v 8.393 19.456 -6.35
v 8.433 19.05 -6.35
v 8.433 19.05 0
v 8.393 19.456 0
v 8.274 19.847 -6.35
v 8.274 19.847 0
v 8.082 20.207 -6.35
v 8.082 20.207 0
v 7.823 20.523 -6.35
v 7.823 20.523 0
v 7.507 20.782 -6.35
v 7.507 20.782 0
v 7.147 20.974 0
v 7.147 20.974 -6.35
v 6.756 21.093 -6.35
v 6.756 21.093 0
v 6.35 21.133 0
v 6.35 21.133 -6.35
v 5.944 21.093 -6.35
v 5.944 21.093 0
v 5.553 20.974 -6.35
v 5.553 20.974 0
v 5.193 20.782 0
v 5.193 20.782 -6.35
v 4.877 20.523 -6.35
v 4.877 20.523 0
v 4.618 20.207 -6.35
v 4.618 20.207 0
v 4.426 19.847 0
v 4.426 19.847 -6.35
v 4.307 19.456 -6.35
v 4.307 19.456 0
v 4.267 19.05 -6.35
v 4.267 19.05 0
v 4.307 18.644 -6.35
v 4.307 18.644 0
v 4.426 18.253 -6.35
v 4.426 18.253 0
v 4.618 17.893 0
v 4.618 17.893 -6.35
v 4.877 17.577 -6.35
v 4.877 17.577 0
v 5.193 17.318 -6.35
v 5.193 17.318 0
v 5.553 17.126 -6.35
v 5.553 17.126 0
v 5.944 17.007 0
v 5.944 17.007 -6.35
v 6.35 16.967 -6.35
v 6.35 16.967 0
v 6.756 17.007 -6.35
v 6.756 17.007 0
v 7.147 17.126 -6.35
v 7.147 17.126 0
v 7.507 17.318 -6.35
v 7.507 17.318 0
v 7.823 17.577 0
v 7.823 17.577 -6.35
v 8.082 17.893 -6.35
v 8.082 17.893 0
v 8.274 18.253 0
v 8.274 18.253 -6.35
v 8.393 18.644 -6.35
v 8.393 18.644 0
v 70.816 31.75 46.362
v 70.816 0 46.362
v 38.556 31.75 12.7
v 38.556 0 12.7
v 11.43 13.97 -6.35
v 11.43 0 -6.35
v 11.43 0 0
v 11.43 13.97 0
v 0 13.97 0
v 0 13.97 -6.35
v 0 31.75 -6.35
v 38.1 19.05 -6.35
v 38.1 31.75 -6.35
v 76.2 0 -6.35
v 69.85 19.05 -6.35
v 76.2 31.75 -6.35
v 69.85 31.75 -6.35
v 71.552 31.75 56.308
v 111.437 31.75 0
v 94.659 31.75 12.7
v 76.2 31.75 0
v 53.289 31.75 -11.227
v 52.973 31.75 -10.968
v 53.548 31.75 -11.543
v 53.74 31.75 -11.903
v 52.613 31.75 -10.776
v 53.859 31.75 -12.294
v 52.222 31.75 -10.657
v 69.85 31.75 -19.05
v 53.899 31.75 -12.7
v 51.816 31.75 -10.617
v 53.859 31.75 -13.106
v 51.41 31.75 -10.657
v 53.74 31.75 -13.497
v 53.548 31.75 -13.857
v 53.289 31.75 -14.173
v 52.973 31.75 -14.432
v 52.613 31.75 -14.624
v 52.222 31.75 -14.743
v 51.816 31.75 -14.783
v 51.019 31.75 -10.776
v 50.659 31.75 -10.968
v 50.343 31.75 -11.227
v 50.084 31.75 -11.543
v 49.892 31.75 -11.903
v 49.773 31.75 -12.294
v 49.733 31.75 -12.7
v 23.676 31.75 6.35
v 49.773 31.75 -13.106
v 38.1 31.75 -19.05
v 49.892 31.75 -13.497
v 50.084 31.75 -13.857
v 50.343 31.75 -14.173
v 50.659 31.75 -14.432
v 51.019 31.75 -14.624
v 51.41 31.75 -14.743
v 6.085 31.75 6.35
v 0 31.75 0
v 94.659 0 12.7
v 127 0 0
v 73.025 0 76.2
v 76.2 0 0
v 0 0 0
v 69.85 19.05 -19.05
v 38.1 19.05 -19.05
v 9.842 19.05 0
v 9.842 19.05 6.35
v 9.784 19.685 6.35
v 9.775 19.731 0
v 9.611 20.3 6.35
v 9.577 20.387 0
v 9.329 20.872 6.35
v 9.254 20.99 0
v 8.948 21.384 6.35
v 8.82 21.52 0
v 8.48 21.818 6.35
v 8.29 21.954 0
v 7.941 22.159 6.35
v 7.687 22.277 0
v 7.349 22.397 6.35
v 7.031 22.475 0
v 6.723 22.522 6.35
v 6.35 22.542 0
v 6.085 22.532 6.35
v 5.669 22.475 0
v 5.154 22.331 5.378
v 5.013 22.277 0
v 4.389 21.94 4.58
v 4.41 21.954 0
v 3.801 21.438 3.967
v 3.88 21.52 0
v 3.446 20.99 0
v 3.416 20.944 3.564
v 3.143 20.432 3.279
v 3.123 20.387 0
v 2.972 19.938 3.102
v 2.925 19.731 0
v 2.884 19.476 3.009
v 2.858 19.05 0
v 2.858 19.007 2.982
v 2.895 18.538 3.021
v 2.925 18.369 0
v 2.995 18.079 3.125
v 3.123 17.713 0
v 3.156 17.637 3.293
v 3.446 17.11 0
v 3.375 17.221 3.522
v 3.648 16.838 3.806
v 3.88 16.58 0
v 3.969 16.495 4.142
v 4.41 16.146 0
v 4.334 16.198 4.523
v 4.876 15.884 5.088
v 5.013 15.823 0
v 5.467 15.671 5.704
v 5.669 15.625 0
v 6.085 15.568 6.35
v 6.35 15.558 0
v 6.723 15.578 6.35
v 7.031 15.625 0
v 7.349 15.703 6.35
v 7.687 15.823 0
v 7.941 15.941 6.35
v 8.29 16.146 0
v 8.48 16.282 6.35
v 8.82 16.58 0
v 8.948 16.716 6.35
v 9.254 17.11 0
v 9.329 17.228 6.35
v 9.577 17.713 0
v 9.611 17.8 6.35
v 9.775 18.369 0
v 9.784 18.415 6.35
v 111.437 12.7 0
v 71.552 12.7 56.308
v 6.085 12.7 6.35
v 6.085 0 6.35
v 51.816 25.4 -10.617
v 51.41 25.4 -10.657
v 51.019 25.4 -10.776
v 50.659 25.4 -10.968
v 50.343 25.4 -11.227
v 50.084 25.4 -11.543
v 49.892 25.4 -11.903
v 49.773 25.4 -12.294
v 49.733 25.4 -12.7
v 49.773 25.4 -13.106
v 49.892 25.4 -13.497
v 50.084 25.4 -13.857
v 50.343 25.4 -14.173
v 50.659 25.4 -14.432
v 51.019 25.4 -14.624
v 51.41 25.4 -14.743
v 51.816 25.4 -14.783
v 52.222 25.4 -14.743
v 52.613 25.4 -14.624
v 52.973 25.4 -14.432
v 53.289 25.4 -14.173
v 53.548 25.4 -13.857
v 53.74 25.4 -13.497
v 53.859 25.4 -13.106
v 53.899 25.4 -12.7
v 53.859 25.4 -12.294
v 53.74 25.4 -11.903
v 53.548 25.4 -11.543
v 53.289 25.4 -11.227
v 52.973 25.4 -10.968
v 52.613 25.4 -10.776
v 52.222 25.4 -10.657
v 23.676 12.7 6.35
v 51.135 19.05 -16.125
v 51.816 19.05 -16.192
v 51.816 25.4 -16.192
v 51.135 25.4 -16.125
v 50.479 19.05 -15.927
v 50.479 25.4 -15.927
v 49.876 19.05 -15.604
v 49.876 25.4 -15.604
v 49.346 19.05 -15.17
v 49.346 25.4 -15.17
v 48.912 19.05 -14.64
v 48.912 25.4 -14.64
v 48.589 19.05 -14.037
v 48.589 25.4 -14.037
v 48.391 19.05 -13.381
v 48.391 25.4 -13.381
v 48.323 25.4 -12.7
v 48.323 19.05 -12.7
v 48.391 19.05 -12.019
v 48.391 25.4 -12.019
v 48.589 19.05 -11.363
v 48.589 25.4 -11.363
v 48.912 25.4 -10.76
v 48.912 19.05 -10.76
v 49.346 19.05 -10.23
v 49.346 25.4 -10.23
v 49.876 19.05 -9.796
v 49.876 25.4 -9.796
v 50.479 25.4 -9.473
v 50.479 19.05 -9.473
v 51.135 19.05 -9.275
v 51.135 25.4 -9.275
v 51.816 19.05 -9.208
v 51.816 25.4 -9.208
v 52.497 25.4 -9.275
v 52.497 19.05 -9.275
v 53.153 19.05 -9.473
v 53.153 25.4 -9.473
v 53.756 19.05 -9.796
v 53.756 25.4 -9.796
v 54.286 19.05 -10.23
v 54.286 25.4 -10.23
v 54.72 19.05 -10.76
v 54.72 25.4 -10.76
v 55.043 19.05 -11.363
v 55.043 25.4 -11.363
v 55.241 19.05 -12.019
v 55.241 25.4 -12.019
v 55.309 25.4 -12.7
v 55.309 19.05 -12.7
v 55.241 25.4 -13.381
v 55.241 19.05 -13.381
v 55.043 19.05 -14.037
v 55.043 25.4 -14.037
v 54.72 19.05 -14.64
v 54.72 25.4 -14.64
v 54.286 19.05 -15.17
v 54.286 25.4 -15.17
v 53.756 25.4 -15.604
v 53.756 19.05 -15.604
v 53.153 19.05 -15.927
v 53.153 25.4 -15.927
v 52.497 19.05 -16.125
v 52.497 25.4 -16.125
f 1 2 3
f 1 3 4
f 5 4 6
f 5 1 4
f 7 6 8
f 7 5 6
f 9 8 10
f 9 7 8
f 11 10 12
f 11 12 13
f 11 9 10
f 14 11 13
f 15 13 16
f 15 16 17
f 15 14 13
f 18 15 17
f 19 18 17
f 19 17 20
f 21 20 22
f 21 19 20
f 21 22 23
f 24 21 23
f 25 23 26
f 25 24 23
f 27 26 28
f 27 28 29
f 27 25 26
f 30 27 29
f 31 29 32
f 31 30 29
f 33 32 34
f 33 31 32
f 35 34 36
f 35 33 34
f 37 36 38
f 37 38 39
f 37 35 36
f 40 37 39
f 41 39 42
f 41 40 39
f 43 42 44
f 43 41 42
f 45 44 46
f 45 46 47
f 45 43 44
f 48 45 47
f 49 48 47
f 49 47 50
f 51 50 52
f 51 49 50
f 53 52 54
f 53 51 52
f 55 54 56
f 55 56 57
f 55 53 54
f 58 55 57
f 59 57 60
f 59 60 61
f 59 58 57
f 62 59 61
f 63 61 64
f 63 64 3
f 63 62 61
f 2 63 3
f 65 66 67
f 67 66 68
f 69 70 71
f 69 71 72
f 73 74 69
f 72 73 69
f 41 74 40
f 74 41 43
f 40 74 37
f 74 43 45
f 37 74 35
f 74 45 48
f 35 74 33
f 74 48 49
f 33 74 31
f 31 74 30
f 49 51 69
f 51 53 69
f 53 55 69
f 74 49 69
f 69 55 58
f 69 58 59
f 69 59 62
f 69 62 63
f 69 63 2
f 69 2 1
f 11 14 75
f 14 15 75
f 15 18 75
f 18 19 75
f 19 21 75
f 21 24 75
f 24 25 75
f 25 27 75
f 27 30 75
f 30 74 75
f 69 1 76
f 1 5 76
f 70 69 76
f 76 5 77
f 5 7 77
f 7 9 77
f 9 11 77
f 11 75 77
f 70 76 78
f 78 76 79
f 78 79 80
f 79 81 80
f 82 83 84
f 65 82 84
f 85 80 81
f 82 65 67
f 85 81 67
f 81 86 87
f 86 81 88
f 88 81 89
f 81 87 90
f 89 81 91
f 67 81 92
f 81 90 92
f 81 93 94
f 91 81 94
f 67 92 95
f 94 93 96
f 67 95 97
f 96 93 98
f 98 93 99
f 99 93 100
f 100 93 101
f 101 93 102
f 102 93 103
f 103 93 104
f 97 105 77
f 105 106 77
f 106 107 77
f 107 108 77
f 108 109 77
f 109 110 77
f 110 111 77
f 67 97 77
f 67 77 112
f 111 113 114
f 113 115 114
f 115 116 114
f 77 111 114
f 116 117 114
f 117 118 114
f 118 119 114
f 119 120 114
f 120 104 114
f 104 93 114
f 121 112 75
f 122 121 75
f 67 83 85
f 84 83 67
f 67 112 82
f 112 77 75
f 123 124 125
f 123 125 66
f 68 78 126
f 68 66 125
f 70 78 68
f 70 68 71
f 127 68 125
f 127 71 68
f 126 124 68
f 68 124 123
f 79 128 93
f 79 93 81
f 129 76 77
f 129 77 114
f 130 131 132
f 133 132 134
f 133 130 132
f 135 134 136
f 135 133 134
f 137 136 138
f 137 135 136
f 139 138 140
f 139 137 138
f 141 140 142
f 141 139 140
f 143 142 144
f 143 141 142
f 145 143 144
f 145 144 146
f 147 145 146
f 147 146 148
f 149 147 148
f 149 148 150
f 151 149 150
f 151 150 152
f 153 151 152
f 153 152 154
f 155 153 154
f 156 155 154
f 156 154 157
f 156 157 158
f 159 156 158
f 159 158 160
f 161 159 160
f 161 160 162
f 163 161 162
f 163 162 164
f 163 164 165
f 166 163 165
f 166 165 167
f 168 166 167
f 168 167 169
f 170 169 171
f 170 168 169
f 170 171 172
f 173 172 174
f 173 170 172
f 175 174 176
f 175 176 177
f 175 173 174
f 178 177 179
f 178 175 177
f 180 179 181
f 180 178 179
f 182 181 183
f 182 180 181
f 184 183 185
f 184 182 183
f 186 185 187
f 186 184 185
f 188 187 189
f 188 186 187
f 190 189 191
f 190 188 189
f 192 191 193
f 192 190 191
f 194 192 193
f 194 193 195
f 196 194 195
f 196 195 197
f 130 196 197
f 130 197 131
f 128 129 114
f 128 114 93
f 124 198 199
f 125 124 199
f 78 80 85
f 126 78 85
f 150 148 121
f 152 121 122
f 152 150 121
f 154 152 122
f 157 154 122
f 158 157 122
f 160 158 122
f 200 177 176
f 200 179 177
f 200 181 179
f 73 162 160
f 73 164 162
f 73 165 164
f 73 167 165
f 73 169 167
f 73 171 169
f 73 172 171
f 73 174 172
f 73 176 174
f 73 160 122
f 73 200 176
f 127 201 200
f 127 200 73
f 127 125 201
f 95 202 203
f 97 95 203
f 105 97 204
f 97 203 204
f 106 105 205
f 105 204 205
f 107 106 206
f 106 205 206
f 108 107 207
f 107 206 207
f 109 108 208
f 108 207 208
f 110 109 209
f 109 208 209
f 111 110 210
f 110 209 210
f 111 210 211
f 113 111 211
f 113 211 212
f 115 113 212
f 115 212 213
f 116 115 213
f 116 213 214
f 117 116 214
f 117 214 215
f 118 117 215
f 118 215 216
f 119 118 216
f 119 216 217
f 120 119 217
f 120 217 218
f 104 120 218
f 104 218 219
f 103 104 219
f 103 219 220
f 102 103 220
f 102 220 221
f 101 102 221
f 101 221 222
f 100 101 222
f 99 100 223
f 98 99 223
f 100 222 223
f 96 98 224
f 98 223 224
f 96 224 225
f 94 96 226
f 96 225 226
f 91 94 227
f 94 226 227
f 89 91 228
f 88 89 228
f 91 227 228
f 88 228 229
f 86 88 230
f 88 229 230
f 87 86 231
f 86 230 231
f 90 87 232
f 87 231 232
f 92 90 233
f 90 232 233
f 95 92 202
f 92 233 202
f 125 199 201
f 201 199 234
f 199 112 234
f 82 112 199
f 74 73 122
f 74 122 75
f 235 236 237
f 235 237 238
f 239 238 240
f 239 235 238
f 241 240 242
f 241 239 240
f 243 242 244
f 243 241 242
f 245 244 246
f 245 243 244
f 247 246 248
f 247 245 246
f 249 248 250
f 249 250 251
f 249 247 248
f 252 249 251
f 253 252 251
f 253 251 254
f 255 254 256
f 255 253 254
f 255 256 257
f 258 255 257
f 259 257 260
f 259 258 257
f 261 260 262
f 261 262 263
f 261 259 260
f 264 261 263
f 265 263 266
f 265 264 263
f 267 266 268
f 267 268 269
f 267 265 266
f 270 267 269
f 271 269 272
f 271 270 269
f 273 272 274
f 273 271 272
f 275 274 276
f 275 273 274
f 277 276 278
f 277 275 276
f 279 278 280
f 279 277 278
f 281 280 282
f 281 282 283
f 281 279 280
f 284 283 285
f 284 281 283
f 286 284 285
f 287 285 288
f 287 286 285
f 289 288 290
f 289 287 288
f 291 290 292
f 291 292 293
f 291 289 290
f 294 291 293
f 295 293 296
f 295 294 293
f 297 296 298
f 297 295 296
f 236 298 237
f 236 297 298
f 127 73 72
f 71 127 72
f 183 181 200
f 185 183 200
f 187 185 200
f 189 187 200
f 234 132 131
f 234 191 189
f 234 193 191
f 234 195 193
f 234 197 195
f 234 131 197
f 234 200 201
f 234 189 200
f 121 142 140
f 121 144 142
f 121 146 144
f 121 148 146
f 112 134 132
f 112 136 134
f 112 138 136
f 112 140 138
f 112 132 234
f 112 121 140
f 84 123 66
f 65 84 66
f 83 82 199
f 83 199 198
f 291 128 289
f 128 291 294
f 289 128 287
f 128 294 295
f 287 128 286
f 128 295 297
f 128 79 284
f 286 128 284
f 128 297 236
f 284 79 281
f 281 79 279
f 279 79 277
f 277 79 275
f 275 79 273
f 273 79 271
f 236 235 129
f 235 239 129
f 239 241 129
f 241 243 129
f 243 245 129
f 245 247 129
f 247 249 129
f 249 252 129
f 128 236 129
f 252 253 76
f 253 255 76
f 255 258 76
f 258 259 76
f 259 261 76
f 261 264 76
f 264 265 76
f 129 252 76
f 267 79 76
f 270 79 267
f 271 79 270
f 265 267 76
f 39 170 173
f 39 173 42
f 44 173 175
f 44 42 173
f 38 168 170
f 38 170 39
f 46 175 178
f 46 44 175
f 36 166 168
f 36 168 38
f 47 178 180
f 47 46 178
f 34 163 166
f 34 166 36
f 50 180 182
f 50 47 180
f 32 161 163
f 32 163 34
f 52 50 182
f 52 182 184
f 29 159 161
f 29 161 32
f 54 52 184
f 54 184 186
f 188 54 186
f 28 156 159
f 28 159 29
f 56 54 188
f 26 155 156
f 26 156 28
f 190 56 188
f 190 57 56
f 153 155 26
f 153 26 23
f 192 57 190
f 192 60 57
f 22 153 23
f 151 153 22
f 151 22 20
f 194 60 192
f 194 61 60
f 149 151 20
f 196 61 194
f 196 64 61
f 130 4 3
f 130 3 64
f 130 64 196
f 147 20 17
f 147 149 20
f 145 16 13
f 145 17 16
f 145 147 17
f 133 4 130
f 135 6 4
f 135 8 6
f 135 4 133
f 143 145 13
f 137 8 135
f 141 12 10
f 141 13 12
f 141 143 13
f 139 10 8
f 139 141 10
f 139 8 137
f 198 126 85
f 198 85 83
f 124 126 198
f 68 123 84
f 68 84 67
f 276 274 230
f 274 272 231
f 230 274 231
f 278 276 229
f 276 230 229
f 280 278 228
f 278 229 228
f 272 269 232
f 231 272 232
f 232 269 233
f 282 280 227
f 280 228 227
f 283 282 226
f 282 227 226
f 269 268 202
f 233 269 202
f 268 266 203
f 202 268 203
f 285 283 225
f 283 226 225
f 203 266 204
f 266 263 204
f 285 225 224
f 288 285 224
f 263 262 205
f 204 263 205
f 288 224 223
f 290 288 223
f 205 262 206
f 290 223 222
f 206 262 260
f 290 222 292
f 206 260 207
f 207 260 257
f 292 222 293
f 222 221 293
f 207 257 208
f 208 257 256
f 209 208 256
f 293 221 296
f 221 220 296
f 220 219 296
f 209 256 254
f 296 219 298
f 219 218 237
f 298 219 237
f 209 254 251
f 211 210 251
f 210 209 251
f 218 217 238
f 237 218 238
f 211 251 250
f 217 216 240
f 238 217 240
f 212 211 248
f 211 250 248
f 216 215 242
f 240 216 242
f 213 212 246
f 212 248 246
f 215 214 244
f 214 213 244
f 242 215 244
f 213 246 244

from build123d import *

# Parameters (mm, degrees)
SKETCH2_R           = 2.0828
BOSS_EXTRUDE1_DEPTH = 31.75
SKETCH4_W           = 31.75
SKETCH4_H           = 12.7
CUT_EXTRUDE1_DEPTH  = 19.05
SKETCH5_R           = 3.4925
CUT_EXTRUDE2_DEPTH  = 6.35
CUT_EXTRUDE6_DEPTH  = 19.05
CHAMFER5_SIZE       = 12.7
CHAMFER7_SIZE       = 12.7
SKETCH6_R           = 3.4925
CUT_EXTRUDE8_DEPTH  = 25.4
SKETCH15_R          = 3.4925
SKETCH15_R_2        = 2.0828
BOSS_EXTRUDE2_DEPTH = 6.35
SKETCH14_W          = 11.43
SKETCH14_H          = 13.97
CUT_EXTRUDE10_DEPTH = 6.35


with BuildPart() as part:
    # Sketch2 → Boss-Extrude1 (new body)
    with BuildSketch(Plane(origin=(0, 0, 0), x_dir=(1, 0, 0), z_dir=(0, 1, 0))):
        Polygon((-69.85, 6.35), (-76.2, 6.35), (-76.2, 0), (-127, 0), (-73.025, -76.2), (0, 0), (0, 6.35), (-38.1, 6.35), (-38.1, 19.05), (-69.85, 19.05), align=None)
        with Locations(Location((-51.816, 12.7, 0), (0, 0, 270))):
            Circle(SKETCH2_R, mode=Mode.SUBTRACT)
        Polygon((-38.556305928, -12.7), (-69.85, -12.7), (-76.2, -12.7), (-94.65927881, -12.7), (-70.815515335, -46.361783729), align=None, mode=Mode.SUBTRACT)
    extrude(amount=BOSS_EXTRUDE1_DEPTH)

    # Sketch4 → Cut-Extrude1 (cut)
    with BuildSketch(Plane.XZ):
        with Locations((-53.975, -12.7)):
            Rectangle(SKETCH4_W, SKETCH4_H)
    extrude(amount=-CUT_EXTRUDE1_DEPTH, mode=Mode.SUBTRACT)

    # Sketch5 → Cut-Extrude2 (cut)
    with BuildSketch(Plane(origin=(0, 19.05, 0), x_dir=(-1, 0, 0), z_dir=(0, -1, 0))):
        with Locations(Location((51.816, 12.7, 0), (0, 0, 90))):
            Circle(SKETCH5_R)
    extrude(amount=-CUT_EXTRUDE2_DEPTH, mode=Mode.SUBTRACT)

    # Sketch3 → Cut-Extrude6 (cut)
    with BuildSketch(Plane(origin=(0, 31.75, 0), x_dir=(1, 0, 0), z_dir=(0, 1, 0))):
        Polygon((-127, 0), (-73.025, -76.2), (-6.085416667, -6.35), (-23.67573173, -6.35), (-71.552010223, -56.307855819), (-111.436741429, 0), align=None)
    extrude(amount=-CUT_EXTRUDE6_DEPTH, mode=Mode.SUBTRACT)

    # Chamfer5
    chamfer5_edges = [part.edges().sort_by_distance(p)[0] for p in [
        (-39.555208333, 12.7, 41.275),
    ]]
    chamfer(chamfer5_edges, length=CHAMFER5_SIZE - 0.0001)  # a hair under: the kernel refuses the full size

    # Chamfer7
    chamfer7_edges = [part.edges().sort_by_distance(p)[0] for p in [
        (-103.750412518, 12.7, 32.822947033),
    ]]
    chamfer(chamfer7_edges, length=CHAMFER7_SIZE - 0.0001)  # a hair under: the kernel refuses the full size

    # Sketch6 → Cut-Extrude8 (cut)
    with BuildSketch(Plane(origin=(0, 0, -6.35), x_dir=(-1, 0, 0), z_dir=(0, 0, -1))):
        with Locations((6.35, 19.05)):
            Circle(SKETCH6_R)
    extrude(amount=-CUT_EXTRUDE8_DEPTH, mode=Mode.SUBTRACT)

    # Sketch15 → Boss-Extrude2 (add)
    with BuildSketch(Plane(origin=(0, 0, -6.35), x_dir=(-1, 0, 0), z_dir=(0, 0, -1))):
        with Locations((6.35, 19.05)):
            Circle(SKETCH15_R)
        with Locations((6.35, 19.05)):
            Circle(SKETCH15_R_2, mode=Mode.SUBTRACT)
    extrude(amount=-BOSS_EXTRUDE2_DEPTH)

    # Sketch14 → Cut-Extrude10 (cut)
    with BuildSketch(Plane(origin=(0, 0, -6.35), x_dir=(-1, 0, 0), z_dir=(0, 0, -1))):
        with Locations((5.715, 6.985)):
            Rectangle(SKETCH14_W, SKETCH14_H)
    extrude(amount=-CUT_EXTRUDE10_DEPTH, mode=Mode.SUBTRACT)


with BuildPart() as body_2:
    # Mirror1: mirrored copy
    add(part.part.mirror(Plane(origin=(0, 31.75, 0), x_dir=(0, 0, 1), z_dir=(-1, 0, 0))))


solid = body_2.part
